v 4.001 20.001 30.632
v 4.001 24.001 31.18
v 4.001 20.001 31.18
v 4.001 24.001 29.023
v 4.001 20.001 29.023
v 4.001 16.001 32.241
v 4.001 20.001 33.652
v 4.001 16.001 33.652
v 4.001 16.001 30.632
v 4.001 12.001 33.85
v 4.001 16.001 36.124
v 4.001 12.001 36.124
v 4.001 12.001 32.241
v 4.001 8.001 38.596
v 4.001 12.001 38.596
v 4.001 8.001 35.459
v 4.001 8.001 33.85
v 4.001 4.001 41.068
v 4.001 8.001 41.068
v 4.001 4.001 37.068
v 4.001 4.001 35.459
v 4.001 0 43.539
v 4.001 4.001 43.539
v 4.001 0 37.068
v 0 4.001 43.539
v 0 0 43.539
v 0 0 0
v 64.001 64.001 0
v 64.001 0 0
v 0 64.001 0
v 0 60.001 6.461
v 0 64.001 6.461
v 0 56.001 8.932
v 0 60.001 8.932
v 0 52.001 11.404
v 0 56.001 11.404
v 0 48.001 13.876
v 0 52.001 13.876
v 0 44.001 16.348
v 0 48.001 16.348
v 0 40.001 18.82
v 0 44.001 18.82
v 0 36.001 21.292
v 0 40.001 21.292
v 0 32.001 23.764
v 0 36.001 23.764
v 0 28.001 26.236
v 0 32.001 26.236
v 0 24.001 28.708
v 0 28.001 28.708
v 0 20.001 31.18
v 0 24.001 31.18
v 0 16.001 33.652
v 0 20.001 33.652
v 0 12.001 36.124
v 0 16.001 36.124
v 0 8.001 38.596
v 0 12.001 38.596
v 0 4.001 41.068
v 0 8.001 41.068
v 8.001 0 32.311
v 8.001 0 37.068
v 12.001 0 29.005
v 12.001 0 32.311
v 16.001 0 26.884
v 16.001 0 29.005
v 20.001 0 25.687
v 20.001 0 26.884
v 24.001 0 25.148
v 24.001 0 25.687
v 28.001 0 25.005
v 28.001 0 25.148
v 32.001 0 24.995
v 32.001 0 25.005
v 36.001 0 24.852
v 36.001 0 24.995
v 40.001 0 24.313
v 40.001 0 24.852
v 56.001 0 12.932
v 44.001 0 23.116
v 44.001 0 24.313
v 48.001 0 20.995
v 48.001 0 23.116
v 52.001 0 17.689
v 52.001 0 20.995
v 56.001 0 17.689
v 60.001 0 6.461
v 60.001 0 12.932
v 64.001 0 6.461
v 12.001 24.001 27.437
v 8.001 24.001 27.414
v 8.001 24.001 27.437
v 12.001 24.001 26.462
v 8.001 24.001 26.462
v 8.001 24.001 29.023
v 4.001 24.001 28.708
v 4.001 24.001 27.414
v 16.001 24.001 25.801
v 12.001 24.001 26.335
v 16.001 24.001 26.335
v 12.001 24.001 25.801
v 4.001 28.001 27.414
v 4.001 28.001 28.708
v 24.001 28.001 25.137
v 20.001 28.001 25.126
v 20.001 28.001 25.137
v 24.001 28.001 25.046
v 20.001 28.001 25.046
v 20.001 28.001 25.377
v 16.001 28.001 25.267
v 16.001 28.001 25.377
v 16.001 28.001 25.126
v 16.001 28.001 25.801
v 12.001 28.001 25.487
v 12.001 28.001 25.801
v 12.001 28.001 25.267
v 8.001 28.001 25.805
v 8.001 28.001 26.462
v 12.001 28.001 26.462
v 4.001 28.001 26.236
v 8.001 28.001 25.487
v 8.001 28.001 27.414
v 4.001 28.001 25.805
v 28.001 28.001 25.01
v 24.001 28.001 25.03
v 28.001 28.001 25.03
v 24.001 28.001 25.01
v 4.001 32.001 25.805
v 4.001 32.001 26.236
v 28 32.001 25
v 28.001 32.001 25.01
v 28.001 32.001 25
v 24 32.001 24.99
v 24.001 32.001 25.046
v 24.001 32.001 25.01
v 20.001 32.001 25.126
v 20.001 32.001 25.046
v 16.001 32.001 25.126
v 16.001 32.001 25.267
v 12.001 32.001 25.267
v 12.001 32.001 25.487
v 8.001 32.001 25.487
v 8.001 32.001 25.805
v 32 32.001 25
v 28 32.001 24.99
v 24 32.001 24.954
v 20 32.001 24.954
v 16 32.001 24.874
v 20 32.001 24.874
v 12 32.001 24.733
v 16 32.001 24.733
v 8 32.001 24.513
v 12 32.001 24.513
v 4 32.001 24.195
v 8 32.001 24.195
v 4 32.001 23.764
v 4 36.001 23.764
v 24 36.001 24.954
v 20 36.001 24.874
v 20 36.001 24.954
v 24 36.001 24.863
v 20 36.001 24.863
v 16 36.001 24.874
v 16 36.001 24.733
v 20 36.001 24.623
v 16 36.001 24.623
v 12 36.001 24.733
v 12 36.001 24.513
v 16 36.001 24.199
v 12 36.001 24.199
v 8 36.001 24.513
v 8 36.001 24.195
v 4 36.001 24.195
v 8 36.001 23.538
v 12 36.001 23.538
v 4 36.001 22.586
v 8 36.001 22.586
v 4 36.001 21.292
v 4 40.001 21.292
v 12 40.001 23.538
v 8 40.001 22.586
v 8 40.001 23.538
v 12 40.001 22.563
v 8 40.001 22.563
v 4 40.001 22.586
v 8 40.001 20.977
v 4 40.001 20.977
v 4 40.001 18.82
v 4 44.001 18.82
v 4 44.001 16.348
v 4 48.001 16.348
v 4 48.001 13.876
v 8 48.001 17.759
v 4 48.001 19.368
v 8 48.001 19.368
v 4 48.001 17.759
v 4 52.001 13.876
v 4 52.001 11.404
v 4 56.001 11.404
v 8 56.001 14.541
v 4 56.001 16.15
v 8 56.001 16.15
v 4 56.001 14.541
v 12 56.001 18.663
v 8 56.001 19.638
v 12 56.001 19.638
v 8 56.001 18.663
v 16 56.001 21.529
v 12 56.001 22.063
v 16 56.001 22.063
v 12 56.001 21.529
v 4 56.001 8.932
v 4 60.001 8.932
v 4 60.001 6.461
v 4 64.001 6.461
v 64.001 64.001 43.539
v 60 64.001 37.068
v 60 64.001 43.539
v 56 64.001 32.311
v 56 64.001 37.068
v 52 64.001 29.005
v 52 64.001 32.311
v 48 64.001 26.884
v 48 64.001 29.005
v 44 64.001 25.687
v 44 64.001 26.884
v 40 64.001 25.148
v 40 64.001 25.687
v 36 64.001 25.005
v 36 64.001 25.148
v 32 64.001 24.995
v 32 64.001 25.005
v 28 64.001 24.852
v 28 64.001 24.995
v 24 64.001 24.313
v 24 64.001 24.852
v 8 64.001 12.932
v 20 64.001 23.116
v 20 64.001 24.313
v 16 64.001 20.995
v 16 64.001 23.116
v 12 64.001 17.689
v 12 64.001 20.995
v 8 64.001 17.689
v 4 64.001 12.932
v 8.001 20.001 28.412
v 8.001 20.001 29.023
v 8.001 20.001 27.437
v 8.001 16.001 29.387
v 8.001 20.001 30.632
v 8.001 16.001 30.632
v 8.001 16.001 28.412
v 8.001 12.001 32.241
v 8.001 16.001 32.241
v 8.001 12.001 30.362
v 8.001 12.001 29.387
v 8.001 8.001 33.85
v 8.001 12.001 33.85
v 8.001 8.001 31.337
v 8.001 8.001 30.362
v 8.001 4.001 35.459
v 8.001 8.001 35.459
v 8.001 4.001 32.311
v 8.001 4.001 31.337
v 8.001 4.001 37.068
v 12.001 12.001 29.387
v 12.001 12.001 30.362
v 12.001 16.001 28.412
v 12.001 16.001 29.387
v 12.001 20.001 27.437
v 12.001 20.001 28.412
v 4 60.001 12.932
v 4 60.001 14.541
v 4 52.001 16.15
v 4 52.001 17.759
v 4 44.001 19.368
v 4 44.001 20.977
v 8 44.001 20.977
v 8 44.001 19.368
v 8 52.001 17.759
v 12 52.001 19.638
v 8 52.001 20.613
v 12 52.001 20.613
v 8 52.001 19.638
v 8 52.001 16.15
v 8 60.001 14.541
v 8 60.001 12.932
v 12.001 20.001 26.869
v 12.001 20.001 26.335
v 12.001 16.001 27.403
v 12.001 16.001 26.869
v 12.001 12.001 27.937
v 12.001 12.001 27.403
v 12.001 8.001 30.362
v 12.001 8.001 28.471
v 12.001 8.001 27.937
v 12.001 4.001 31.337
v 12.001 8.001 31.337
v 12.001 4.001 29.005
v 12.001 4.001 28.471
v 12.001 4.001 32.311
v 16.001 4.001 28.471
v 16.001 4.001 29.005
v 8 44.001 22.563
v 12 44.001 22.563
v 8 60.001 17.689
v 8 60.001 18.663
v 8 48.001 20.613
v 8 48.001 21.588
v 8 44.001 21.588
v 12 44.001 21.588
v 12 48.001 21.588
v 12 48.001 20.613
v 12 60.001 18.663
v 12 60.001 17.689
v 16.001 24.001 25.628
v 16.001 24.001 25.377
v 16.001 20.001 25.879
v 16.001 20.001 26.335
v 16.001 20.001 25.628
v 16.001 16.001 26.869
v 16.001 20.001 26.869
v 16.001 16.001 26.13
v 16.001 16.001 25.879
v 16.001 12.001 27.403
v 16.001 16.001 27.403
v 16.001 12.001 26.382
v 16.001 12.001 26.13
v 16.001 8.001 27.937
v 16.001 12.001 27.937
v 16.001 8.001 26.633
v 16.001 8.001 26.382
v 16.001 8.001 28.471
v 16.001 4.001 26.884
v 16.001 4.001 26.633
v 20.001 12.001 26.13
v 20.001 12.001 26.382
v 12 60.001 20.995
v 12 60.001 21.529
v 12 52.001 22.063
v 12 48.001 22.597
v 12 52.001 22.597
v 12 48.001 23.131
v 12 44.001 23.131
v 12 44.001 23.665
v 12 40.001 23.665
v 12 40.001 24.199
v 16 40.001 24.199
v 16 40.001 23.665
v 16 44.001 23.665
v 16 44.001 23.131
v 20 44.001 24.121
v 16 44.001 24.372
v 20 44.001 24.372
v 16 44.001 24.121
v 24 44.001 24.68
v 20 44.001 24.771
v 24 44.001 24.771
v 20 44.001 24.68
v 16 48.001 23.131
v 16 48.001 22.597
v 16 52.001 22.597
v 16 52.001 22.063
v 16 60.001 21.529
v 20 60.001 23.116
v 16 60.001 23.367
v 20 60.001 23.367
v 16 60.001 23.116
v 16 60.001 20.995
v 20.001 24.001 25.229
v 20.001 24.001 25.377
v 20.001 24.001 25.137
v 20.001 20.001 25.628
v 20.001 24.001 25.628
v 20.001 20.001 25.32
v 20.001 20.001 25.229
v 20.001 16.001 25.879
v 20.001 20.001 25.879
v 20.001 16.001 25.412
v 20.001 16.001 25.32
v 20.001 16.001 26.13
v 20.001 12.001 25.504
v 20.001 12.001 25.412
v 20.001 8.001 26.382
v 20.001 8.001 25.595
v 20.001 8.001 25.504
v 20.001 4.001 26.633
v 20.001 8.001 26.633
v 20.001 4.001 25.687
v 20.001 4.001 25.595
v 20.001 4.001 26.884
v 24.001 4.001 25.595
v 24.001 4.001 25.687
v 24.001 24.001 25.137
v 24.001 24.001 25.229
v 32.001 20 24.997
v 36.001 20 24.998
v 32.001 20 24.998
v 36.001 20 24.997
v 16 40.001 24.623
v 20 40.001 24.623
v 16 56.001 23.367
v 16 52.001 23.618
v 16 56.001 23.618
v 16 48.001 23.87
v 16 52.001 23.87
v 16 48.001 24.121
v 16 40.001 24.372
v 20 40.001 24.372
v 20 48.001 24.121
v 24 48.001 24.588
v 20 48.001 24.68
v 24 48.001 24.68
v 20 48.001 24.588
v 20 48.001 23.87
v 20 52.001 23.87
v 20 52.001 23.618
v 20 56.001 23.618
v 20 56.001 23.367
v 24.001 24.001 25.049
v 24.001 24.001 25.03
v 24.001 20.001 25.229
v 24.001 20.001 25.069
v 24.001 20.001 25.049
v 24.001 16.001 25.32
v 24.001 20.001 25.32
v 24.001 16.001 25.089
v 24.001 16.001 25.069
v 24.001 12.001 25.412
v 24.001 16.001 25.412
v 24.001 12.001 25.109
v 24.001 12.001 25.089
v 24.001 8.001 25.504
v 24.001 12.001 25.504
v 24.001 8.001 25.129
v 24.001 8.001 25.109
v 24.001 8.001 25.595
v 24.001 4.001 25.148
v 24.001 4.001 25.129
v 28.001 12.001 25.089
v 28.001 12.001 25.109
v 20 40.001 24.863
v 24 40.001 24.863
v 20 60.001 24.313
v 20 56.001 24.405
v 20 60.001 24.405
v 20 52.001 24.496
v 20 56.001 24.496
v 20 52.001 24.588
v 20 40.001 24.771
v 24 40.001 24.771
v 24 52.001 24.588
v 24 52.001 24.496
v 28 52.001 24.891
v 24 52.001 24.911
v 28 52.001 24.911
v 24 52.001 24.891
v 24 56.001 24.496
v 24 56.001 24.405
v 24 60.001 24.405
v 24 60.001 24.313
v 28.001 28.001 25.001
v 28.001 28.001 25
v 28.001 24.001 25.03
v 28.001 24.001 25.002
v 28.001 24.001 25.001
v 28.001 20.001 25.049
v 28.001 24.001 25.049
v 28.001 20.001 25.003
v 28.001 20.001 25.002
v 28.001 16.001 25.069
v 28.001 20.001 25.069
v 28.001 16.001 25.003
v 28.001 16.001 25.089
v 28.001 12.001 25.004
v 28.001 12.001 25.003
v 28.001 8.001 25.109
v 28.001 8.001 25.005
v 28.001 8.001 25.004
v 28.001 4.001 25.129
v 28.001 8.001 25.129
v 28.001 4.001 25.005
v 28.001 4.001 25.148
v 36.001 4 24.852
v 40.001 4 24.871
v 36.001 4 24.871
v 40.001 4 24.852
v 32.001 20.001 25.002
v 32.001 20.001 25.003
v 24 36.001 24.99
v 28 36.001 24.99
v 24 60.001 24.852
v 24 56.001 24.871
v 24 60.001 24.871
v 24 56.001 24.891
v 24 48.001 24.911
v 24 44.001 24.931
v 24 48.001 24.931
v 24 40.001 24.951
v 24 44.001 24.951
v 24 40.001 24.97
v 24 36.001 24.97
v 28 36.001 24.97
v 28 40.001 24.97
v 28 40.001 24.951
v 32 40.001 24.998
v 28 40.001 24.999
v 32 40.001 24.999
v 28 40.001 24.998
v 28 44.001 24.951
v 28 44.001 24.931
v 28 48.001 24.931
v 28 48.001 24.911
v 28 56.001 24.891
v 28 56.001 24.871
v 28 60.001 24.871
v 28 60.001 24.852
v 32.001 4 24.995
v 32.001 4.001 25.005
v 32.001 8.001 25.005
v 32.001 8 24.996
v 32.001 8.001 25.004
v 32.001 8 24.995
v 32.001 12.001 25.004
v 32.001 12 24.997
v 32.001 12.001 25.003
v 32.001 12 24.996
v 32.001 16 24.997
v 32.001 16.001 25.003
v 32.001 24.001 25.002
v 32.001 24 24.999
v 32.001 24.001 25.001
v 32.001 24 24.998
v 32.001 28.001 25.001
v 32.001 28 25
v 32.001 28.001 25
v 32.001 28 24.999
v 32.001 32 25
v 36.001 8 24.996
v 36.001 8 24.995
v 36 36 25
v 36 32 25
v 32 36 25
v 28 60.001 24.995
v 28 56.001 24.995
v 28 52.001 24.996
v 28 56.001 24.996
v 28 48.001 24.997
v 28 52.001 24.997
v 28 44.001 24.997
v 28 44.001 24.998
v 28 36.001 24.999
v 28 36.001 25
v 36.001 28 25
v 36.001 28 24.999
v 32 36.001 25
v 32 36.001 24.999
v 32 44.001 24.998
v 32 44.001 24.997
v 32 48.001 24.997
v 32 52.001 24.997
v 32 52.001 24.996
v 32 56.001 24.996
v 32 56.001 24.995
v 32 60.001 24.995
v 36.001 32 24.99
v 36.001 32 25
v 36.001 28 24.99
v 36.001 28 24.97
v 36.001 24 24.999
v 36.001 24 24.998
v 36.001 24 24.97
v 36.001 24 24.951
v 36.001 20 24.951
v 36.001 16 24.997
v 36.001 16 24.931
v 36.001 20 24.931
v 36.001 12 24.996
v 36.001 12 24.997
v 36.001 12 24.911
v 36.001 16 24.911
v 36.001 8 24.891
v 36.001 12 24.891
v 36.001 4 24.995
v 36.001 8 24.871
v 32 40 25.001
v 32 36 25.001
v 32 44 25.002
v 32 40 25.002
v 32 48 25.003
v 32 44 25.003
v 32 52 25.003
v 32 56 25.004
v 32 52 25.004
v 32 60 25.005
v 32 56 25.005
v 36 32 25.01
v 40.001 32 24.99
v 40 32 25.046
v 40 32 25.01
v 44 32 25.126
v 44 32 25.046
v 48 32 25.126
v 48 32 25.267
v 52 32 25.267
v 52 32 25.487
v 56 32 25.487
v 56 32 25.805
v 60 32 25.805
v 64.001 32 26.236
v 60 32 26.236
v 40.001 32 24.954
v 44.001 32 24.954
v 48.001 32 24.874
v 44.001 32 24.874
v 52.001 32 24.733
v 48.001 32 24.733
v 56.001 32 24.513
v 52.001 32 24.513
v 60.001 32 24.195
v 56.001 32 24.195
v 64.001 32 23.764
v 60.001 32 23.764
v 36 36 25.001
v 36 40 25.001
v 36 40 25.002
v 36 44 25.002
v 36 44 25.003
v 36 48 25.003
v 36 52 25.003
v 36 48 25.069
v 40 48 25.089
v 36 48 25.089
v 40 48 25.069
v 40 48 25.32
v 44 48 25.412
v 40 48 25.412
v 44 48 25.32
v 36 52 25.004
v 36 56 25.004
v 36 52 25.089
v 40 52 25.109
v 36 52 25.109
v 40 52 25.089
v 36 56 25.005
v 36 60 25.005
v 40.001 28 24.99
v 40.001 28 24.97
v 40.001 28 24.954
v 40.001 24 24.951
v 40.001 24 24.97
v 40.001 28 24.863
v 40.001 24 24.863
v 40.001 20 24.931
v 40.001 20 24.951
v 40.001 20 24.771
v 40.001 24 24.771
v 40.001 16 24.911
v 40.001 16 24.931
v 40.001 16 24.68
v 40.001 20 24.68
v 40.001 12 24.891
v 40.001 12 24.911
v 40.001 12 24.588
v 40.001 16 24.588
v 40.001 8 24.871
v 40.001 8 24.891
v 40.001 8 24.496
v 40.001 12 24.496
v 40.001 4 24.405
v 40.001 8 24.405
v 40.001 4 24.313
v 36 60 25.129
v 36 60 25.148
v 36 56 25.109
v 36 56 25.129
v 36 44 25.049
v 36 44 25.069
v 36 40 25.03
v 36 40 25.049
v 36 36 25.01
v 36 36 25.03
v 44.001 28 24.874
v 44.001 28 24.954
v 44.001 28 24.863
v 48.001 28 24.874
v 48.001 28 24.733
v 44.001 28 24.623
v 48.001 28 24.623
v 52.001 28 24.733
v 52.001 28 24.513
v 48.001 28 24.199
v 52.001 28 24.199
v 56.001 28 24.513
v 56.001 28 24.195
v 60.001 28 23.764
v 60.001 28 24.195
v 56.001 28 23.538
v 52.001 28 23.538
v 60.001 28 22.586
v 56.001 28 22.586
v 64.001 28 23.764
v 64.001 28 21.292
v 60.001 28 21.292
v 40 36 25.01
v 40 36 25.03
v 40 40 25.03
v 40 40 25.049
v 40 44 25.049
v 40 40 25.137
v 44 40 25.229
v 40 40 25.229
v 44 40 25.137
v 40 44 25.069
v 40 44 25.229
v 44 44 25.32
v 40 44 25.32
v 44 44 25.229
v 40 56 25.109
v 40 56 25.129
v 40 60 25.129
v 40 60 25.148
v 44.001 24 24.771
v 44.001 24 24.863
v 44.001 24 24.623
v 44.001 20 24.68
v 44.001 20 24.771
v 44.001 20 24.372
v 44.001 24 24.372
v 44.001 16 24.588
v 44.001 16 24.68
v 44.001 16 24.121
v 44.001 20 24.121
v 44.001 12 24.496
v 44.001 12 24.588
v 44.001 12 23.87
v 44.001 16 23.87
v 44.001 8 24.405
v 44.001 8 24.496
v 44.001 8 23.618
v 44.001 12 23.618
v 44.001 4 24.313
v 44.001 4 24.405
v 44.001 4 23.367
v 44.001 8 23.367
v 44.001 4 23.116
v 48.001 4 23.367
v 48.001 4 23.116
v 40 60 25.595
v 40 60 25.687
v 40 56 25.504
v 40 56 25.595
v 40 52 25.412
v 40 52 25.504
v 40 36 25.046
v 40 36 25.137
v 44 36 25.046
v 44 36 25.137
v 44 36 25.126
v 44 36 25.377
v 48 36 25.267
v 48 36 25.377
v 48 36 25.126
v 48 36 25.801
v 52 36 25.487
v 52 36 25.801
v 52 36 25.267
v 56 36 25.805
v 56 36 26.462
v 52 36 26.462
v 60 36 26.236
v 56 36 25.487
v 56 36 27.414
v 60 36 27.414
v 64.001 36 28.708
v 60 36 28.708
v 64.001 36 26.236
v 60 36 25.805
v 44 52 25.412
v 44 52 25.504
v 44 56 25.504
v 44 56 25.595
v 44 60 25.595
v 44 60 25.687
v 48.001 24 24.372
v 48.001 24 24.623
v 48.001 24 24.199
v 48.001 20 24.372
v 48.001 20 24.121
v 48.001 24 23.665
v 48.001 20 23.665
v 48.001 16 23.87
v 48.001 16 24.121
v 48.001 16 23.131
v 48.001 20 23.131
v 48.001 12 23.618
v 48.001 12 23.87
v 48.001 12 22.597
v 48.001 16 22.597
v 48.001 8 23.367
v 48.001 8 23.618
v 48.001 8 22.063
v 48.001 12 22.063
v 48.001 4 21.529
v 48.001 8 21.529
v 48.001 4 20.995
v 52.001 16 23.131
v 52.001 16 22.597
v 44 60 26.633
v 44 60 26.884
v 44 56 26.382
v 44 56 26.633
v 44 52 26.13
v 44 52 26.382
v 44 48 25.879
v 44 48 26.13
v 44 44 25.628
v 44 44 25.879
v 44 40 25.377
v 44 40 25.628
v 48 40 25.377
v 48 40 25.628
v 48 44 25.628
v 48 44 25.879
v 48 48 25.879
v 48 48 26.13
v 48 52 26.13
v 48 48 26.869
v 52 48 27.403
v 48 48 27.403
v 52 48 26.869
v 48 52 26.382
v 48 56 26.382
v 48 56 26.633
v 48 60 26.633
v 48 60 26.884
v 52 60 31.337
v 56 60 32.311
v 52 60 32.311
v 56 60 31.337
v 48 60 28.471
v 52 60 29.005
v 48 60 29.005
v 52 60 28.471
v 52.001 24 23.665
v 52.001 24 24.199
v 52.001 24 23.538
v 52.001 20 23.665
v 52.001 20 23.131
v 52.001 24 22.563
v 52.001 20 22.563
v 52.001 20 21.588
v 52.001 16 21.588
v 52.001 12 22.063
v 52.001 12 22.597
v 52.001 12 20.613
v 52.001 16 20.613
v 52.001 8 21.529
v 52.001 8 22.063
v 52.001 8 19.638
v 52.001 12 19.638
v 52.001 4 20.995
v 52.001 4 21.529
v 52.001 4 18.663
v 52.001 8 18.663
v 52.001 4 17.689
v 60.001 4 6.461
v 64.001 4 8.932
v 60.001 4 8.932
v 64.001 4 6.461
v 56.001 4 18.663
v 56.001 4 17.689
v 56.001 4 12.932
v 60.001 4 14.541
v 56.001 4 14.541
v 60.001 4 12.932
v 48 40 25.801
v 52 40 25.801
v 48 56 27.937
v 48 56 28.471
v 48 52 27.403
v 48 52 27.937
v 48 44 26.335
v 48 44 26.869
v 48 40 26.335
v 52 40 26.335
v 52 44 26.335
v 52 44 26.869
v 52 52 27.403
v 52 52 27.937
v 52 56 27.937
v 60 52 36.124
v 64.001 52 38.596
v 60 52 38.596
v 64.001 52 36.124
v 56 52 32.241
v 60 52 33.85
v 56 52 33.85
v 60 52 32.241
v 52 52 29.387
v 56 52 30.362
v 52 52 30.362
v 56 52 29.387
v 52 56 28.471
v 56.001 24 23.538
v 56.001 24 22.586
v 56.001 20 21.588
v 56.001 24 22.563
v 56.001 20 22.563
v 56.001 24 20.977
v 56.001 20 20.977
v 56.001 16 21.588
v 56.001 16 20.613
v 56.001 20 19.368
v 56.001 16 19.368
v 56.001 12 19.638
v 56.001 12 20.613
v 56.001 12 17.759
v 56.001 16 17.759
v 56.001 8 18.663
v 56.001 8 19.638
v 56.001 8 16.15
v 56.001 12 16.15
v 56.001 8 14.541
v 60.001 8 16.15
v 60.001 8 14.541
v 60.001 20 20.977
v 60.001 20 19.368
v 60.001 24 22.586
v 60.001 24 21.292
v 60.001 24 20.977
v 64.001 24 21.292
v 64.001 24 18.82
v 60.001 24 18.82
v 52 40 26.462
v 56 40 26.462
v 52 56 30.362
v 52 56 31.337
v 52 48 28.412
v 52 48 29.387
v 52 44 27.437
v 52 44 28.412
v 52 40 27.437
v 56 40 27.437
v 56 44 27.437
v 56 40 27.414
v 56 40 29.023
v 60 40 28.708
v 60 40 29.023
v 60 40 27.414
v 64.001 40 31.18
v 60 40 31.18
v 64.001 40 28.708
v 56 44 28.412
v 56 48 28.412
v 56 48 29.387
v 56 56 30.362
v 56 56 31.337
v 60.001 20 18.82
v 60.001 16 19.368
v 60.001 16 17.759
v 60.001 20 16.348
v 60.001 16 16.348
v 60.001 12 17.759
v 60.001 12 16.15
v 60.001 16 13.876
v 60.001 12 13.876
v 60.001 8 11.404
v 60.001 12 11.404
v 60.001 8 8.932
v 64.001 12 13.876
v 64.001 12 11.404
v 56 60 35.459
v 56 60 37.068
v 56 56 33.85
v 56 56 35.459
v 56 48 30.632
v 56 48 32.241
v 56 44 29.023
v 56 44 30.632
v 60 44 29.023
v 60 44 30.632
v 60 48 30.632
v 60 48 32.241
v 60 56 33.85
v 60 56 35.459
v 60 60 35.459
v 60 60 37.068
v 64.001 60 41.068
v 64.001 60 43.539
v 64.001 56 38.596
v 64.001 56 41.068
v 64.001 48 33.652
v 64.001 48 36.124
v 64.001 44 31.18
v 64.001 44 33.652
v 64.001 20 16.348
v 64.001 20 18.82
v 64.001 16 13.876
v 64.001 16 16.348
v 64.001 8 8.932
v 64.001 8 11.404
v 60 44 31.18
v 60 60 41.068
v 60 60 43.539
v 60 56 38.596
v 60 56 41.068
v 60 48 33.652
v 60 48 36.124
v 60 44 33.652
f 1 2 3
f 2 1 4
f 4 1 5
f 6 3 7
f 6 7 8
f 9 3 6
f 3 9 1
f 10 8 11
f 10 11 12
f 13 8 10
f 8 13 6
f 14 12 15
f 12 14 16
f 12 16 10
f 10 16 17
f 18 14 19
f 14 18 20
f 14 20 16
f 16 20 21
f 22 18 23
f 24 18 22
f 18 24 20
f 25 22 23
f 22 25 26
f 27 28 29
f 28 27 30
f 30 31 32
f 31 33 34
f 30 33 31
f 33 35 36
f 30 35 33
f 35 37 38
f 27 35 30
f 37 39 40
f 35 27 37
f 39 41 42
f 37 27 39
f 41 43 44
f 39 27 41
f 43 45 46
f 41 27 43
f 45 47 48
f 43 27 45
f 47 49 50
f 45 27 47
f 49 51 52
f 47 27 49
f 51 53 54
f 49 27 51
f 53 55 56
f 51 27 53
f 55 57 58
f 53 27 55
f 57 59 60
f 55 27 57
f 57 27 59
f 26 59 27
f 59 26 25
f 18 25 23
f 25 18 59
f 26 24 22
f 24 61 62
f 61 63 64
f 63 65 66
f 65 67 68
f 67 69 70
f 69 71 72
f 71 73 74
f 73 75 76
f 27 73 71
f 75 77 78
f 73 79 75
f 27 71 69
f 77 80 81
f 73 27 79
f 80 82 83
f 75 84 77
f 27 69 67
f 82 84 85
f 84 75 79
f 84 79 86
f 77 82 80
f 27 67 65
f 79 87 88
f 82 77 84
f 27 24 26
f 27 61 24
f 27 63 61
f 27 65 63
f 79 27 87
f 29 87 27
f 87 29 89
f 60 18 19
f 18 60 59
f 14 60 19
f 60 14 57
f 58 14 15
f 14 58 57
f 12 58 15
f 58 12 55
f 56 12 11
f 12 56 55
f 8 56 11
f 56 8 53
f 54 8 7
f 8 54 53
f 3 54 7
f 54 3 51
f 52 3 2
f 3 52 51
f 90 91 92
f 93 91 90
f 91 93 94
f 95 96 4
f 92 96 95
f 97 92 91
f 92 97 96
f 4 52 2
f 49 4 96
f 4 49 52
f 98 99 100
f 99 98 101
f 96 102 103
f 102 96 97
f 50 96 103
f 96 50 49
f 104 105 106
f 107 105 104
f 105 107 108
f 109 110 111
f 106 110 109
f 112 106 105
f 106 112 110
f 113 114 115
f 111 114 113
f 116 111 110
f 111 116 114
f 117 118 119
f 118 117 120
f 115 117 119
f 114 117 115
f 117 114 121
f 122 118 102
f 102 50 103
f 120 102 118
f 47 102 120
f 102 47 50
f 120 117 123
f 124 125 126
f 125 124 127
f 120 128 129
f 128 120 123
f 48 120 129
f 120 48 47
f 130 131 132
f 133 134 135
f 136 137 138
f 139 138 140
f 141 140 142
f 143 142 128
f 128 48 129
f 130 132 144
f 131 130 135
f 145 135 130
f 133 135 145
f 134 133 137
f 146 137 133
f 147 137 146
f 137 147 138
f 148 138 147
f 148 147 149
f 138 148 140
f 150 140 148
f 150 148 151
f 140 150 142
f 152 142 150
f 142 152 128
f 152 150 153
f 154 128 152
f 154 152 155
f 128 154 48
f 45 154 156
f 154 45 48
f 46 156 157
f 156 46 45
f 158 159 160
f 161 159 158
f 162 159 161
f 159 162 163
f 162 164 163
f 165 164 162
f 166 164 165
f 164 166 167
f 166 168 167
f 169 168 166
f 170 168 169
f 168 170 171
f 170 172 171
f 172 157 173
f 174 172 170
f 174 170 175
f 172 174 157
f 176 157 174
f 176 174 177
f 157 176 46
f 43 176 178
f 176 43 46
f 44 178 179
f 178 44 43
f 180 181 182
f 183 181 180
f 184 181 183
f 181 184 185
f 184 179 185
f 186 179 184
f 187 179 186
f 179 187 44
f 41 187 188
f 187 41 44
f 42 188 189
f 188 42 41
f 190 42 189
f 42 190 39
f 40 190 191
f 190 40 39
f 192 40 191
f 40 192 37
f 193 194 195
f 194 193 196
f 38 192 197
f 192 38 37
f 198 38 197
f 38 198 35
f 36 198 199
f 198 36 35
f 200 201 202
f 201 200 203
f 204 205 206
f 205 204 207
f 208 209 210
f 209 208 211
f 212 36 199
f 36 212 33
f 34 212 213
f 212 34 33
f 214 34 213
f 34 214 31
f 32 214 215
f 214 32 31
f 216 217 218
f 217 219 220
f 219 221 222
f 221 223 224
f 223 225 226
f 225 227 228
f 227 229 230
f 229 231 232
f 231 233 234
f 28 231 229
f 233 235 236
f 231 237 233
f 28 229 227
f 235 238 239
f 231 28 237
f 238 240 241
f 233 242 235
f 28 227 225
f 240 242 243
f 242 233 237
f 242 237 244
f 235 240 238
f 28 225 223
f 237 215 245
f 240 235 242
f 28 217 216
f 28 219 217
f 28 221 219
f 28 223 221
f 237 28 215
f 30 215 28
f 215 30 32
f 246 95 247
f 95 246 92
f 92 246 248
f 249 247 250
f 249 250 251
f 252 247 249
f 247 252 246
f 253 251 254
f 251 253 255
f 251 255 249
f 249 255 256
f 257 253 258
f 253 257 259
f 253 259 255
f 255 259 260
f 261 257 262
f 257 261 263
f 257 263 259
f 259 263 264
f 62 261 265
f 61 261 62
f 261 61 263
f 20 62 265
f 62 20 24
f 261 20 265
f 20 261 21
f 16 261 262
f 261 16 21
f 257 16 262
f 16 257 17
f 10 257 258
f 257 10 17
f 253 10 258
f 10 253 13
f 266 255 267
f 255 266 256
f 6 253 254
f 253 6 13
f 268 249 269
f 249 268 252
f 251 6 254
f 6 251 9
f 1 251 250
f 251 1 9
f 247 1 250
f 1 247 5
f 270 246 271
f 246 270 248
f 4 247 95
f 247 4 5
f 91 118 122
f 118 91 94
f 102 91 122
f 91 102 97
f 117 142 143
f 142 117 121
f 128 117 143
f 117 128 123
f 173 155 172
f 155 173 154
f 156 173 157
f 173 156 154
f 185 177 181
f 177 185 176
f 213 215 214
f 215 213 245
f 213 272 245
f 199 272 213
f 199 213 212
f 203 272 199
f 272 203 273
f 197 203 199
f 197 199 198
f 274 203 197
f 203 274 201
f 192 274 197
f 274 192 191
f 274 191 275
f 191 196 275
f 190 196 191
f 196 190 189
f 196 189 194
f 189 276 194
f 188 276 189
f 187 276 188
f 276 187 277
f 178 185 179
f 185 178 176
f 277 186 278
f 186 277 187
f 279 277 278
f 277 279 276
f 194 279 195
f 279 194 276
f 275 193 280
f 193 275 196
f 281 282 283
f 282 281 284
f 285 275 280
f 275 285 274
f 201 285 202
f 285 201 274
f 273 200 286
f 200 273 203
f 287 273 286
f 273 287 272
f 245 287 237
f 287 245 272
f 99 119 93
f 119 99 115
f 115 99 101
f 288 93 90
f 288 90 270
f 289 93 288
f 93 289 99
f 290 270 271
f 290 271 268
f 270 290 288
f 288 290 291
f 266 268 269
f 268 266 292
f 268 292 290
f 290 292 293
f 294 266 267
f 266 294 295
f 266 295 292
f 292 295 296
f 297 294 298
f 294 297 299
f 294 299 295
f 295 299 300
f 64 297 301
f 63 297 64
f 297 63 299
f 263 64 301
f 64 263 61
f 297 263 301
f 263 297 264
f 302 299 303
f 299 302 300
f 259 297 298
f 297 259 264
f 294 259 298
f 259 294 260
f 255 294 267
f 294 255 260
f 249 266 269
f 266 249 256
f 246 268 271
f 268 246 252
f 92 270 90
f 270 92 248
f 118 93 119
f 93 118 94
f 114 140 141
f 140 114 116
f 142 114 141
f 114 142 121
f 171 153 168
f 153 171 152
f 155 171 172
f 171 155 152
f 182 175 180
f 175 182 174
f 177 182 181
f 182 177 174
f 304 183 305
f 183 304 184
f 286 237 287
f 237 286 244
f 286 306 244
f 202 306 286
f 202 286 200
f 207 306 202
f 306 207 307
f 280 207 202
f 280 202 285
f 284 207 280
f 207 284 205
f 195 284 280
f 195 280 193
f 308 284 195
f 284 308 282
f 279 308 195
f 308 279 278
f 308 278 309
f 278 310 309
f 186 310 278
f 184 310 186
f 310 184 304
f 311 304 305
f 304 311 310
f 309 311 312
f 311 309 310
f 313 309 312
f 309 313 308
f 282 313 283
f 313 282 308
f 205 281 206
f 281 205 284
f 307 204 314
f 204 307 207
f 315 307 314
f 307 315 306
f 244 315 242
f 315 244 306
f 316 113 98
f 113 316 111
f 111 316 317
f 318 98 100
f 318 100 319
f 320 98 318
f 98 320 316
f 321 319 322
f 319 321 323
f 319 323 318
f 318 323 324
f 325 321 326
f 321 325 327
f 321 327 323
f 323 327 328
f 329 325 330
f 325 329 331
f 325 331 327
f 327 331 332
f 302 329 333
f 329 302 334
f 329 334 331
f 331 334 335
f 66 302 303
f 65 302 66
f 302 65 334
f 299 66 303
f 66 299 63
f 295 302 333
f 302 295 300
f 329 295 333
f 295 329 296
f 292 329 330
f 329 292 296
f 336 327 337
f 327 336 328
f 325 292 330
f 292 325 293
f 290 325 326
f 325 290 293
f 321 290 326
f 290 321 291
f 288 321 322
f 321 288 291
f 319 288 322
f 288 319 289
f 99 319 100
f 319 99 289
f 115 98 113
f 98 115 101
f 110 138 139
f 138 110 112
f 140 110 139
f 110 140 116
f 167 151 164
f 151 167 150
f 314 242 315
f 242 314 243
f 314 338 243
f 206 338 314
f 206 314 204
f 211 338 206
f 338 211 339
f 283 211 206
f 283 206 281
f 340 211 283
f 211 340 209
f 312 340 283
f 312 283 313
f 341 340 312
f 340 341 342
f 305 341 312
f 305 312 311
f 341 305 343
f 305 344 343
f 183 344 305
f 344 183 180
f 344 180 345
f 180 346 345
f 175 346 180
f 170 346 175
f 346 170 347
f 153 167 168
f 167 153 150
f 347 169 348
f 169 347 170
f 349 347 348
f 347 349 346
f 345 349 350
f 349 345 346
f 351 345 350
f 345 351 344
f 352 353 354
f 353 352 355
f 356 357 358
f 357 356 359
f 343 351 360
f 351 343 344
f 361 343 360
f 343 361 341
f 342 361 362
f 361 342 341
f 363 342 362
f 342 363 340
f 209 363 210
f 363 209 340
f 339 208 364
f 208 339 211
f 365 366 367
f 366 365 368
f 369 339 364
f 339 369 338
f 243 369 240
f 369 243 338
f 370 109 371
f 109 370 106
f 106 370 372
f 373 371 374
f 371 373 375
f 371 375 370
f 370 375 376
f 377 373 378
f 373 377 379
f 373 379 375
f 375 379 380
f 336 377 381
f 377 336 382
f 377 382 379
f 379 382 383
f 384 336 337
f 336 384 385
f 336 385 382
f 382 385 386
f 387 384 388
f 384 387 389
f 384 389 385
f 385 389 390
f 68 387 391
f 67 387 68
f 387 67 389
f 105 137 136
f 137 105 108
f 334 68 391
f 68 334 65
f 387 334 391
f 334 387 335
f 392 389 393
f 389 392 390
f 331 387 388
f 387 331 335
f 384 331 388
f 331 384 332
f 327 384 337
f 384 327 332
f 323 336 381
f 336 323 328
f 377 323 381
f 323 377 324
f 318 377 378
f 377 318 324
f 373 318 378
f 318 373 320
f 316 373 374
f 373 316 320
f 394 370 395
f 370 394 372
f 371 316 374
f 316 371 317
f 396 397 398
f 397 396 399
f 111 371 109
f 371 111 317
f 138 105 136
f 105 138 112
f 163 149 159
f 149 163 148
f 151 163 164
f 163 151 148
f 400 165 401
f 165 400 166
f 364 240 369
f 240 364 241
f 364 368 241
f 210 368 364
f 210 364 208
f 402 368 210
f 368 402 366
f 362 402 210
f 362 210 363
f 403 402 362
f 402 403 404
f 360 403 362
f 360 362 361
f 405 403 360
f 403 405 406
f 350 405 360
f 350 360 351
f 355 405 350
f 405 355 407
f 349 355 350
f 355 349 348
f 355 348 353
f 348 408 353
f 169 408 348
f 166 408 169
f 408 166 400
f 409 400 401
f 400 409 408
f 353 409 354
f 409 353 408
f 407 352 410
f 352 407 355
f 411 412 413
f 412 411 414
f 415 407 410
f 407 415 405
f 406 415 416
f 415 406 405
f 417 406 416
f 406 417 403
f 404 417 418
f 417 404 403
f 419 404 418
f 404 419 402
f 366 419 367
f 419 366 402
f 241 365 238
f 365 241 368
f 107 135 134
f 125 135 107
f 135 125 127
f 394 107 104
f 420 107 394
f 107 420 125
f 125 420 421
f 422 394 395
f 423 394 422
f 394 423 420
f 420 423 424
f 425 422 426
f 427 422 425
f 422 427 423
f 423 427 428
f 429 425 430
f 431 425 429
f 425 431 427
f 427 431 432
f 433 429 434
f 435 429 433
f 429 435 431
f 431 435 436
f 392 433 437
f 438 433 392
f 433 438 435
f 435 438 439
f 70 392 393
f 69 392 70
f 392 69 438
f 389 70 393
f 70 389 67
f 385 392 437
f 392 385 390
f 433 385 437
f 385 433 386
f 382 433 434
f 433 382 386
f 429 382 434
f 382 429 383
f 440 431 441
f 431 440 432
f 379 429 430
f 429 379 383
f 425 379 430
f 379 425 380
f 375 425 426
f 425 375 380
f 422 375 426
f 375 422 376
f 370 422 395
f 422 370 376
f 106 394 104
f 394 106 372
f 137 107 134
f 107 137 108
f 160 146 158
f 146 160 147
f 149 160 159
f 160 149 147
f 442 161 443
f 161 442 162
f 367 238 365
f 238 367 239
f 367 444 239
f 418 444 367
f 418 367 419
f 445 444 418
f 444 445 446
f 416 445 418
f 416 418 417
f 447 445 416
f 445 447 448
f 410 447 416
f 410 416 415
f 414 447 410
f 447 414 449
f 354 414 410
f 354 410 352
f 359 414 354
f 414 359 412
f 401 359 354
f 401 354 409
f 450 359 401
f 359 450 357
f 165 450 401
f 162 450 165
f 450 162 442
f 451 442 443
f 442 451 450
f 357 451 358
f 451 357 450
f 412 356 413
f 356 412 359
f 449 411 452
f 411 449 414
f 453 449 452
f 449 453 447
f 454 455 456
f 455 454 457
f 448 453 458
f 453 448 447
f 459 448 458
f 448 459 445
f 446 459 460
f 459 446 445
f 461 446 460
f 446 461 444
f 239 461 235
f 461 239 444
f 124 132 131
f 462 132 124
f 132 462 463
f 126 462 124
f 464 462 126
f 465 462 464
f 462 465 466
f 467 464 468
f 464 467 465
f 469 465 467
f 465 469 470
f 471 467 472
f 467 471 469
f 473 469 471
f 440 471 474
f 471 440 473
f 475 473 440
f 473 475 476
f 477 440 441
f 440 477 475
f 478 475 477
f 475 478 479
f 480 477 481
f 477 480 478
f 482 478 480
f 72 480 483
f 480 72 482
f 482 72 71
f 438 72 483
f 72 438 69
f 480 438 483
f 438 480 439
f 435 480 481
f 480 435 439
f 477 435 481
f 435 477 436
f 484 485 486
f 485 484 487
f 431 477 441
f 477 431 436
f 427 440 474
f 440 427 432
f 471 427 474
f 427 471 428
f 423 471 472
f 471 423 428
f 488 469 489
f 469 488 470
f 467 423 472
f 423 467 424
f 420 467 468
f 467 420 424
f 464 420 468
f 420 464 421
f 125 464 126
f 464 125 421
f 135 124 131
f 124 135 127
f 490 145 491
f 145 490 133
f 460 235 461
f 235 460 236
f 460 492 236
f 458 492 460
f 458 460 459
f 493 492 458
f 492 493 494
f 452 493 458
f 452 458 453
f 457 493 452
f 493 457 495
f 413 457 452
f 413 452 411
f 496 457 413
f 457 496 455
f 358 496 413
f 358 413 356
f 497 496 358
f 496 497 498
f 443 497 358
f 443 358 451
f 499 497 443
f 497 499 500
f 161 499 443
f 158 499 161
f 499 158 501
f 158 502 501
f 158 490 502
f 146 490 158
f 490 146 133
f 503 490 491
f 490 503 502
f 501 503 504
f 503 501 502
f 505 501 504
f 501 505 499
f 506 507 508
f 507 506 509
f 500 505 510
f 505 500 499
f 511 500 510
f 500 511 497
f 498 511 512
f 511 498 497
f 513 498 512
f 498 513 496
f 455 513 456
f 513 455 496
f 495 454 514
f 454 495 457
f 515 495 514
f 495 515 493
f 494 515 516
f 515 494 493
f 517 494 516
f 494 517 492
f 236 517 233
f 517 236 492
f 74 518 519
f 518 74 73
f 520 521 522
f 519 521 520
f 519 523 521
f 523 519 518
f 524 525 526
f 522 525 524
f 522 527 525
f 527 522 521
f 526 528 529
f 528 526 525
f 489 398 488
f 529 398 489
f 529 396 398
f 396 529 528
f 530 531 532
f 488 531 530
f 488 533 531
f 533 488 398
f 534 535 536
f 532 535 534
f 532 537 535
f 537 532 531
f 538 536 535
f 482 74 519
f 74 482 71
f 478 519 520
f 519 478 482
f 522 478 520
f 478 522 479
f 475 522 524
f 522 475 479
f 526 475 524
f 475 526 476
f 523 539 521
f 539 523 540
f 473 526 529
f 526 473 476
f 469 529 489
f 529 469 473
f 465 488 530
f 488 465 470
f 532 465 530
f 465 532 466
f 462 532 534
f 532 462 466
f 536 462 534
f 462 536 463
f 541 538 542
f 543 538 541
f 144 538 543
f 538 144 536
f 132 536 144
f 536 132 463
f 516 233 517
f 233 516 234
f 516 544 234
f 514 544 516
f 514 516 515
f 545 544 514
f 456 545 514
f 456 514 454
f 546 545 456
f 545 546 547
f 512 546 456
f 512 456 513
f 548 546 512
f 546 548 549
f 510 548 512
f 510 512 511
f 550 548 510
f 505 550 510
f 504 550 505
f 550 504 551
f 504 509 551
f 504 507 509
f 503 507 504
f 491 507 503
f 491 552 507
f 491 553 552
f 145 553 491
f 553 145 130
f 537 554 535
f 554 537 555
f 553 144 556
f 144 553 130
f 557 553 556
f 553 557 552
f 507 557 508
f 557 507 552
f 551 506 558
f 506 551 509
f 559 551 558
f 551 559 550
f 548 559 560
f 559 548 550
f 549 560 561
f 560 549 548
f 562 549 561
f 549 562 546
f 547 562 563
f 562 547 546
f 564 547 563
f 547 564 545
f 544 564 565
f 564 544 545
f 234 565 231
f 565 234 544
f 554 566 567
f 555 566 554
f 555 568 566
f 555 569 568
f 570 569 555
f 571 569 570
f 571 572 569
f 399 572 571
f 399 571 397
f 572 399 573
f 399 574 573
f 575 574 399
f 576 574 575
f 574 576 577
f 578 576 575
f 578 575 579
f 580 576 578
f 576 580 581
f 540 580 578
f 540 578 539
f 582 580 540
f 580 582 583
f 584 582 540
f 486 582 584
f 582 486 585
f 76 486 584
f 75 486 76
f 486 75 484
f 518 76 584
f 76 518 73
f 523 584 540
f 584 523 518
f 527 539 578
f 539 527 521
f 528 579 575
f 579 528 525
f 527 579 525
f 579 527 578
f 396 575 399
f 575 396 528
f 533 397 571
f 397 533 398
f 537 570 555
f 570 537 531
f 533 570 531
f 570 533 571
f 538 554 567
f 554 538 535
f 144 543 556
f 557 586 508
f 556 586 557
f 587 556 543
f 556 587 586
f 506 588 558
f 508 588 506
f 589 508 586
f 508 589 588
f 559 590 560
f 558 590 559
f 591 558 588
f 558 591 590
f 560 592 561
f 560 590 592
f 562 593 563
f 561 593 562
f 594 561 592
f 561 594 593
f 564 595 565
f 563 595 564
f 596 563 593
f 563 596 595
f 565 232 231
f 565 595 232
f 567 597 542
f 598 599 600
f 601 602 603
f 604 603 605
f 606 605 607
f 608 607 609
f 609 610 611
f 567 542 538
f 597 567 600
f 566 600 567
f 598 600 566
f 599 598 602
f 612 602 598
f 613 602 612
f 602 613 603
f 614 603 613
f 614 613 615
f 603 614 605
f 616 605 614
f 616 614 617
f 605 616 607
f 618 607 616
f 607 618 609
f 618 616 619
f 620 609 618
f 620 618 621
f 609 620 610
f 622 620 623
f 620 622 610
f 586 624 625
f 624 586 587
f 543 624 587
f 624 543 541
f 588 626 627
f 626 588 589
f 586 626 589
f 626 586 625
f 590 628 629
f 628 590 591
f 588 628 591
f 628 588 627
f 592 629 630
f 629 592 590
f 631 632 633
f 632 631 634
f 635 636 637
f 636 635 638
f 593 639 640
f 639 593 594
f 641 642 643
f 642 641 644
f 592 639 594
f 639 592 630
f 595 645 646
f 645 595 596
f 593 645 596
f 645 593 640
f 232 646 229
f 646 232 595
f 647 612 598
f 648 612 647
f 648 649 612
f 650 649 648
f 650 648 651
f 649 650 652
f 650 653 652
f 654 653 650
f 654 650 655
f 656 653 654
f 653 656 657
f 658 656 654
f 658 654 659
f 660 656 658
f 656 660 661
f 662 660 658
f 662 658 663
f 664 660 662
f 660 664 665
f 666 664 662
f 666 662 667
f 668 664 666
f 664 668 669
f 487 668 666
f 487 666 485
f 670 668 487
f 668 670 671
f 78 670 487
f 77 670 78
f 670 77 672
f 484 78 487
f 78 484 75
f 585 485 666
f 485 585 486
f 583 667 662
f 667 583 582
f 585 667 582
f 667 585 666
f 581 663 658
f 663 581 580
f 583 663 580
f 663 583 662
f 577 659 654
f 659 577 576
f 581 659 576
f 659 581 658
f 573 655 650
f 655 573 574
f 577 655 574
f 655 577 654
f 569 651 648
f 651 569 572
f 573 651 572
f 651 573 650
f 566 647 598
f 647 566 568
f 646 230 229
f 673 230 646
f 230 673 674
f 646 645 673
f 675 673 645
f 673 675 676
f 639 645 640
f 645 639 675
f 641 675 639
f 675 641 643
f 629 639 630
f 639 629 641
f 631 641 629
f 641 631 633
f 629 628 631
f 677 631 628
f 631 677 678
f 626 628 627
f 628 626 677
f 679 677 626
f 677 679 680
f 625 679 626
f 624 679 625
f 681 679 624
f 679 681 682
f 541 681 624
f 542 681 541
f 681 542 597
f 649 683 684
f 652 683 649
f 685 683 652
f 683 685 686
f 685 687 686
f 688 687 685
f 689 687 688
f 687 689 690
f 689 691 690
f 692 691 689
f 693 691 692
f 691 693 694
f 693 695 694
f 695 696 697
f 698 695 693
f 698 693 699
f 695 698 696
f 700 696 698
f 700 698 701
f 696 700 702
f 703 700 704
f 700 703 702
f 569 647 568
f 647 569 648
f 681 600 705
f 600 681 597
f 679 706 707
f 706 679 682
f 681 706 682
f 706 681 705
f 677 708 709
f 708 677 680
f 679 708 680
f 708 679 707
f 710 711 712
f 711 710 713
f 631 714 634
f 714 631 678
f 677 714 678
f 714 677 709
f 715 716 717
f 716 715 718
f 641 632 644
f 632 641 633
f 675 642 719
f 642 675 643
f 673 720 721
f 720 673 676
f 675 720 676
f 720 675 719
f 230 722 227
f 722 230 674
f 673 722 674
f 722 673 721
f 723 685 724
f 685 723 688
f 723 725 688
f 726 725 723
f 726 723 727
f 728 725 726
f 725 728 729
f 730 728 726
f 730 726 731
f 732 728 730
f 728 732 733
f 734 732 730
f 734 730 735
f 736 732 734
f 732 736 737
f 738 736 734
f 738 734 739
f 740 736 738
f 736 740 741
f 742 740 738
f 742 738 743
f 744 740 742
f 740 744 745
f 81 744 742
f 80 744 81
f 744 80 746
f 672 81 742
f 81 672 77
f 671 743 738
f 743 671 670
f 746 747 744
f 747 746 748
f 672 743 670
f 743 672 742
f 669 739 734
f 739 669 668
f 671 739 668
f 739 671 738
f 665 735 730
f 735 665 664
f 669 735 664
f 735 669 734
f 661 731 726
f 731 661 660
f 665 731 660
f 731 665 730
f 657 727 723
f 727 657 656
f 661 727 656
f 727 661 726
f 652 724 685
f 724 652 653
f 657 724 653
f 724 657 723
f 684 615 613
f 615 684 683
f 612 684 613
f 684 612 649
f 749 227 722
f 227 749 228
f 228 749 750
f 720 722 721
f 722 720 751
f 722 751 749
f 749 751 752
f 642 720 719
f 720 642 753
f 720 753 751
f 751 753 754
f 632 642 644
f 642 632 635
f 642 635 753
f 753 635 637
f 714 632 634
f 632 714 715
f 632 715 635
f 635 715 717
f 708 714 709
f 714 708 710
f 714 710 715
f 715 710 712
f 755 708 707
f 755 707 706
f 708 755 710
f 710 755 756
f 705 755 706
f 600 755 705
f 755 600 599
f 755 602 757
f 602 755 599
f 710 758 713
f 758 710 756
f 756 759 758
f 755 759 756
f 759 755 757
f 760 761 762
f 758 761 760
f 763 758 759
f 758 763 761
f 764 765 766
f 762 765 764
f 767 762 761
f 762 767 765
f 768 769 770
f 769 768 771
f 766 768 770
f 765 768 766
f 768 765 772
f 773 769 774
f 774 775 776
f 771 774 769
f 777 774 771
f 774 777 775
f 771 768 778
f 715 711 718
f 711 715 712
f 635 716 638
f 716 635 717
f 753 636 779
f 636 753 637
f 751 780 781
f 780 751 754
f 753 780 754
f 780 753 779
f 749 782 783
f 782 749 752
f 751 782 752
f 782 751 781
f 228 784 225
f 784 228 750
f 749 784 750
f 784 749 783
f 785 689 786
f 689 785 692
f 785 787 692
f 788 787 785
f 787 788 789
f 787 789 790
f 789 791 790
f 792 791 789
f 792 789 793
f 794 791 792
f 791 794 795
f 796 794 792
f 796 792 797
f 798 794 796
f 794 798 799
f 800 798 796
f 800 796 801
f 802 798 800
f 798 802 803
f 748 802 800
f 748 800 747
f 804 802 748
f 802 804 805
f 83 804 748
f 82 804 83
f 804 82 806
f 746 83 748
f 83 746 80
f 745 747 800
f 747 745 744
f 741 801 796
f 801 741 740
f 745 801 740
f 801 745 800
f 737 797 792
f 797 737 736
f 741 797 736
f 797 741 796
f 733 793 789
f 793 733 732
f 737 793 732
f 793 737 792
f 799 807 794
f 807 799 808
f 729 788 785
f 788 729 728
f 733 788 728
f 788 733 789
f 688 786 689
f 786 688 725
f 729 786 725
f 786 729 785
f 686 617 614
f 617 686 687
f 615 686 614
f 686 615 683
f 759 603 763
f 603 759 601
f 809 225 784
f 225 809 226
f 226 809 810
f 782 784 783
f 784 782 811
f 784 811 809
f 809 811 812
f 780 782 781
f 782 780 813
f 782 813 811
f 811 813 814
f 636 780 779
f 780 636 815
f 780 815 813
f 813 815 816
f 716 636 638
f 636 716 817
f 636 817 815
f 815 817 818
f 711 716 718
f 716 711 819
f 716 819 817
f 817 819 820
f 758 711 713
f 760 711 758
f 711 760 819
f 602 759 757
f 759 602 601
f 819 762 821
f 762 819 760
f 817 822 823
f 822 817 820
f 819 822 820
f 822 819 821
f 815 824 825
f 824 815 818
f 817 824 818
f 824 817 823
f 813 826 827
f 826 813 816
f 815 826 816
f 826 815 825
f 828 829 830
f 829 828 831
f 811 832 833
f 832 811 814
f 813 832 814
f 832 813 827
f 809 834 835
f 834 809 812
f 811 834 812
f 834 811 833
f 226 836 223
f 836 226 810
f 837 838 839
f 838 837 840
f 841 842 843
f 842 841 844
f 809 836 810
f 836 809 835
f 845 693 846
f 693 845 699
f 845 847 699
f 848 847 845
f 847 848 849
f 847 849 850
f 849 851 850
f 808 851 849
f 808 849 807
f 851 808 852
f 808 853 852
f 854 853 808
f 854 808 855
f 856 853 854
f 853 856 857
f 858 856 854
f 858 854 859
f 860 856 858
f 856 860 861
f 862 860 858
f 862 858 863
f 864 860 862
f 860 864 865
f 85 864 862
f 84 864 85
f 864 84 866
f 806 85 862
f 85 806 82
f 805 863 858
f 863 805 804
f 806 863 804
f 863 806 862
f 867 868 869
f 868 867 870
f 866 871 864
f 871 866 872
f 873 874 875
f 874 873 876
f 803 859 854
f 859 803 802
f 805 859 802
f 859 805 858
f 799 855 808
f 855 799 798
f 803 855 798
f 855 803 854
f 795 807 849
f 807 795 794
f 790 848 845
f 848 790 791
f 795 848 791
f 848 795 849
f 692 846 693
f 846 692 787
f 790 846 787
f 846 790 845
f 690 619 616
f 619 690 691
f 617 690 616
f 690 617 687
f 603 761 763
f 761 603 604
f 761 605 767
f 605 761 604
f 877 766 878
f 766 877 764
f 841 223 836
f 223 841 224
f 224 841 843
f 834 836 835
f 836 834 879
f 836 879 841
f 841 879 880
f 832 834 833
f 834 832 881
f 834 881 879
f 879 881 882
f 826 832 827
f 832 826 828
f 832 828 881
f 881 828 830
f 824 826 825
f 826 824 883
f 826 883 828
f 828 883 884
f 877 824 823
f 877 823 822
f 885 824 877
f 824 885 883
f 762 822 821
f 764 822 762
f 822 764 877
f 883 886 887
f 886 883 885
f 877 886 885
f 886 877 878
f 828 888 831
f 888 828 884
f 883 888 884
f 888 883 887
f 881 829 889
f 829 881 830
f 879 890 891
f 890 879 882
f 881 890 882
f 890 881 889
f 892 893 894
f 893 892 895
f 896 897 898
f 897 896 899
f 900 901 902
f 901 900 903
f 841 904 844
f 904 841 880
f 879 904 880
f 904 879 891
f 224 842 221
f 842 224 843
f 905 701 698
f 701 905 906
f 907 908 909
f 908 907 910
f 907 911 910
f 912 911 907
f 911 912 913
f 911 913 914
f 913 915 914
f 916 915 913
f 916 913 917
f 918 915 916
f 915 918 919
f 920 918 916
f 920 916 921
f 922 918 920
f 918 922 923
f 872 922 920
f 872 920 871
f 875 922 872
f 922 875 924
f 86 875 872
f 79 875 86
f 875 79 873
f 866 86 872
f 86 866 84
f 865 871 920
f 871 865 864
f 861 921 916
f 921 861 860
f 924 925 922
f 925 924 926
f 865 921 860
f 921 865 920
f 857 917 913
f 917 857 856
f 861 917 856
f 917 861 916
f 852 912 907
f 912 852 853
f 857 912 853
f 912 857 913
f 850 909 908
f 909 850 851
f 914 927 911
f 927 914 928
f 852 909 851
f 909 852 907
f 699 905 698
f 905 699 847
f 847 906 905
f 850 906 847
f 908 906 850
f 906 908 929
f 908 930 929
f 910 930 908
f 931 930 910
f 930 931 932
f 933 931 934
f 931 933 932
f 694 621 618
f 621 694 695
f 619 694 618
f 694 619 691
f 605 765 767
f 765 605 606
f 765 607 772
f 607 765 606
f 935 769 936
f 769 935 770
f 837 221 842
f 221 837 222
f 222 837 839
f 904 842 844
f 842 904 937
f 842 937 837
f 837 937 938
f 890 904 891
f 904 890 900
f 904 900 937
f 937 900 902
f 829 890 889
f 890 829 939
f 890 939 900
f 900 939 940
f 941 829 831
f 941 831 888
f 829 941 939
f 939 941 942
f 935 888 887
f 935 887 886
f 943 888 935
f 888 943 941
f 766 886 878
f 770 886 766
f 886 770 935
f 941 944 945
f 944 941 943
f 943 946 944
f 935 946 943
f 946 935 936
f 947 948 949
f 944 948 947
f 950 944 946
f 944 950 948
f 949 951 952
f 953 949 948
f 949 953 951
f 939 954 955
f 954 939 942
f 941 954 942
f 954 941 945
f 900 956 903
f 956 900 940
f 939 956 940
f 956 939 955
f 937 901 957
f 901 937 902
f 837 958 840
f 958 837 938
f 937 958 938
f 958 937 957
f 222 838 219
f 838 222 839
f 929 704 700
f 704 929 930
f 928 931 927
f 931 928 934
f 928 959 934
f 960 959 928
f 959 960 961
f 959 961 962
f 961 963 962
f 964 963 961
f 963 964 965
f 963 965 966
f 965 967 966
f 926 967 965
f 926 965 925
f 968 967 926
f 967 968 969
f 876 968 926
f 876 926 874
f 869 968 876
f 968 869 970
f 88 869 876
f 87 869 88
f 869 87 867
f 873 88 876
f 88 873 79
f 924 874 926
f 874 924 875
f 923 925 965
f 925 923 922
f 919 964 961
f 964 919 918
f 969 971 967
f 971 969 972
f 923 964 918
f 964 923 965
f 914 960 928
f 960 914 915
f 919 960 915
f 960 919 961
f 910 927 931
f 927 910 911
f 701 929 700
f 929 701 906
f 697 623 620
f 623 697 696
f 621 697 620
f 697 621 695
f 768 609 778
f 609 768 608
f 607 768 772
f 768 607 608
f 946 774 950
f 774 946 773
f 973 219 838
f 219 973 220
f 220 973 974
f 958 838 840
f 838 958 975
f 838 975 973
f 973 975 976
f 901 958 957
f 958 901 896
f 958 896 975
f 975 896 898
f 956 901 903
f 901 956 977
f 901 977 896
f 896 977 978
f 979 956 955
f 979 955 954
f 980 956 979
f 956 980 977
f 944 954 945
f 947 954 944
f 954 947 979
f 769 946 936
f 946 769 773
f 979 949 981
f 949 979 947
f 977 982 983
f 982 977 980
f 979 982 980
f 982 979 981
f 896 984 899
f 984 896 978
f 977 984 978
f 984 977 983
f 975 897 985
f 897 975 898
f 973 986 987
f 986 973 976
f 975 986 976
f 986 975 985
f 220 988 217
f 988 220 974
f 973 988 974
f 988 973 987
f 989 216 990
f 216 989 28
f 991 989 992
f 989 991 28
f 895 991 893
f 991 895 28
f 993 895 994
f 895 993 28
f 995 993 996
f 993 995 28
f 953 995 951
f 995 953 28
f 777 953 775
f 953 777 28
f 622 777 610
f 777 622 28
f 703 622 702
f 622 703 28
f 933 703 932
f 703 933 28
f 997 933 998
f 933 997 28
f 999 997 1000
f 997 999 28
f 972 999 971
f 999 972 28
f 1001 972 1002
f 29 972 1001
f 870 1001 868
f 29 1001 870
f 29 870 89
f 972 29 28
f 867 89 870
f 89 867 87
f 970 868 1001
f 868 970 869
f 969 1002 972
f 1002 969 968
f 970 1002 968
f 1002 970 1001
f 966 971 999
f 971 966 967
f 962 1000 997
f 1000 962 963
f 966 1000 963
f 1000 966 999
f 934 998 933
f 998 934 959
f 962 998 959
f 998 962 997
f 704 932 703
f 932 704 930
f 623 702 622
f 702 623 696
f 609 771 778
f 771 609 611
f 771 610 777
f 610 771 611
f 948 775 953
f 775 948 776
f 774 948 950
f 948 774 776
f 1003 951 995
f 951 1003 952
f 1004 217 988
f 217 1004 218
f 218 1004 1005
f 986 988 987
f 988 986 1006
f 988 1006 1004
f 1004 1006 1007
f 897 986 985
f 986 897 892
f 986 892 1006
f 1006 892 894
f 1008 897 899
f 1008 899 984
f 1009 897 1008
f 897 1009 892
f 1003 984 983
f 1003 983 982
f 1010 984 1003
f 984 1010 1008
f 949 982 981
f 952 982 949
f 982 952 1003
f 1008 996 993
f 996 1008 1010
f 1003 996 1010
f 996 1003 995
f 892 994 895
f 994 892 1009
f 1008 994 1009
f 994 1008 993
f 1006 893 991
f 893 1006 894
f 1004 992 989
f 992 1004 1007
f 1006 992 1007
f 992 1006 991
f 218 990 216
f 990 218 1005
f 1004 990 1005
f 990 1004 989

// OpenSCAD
// File limitsBlocky.scad
// demonstrates breaking a surface function f(x, y) into blocks
// using a variable resolution
// (c) 2017-2022 Rich Cameron, for the book Make:Calculus
// Licensed under a Creative Commons, Attribution,
// CC-BY 4.0 international license, per
// https://creativecommons.org/licenses/by/4.0/
// Attribute to Rich Cameron, at
// repository github.com/whosawhatsis/Calculus

res = 16; // [4, 8, 16, 32, 64, 128]
    // resolution in x and y dimensions
zscale = 48;//scaling factor for the height of the surface
range = [64, 64]; //size, in mm, of the surface in x and y dimensions

center = [range[0]/2, range[1]/2]; //puts (0, 0) at the model's center

//The function definition
function f(x, y) = zscale * pow(x - center[0], 3) * (y - center[1]) /
	(range[1] * pow(range[0] / 2, 3))
	+ zscale / 2 + 1;
/* 
Next we create the rectangular solids and move them to the 
	correct (x,y) position 
*/
for(x = [0:res - 1], y = [0:res - 1])
 	translate([range[0] * x / res, range[1] * y / res, 0])
		cube([range[0] / res + .001,
			range[1] / res + .001,
				f(range[0] * (x + .5) / res, range[1] * (y + .5) / res)
]);
